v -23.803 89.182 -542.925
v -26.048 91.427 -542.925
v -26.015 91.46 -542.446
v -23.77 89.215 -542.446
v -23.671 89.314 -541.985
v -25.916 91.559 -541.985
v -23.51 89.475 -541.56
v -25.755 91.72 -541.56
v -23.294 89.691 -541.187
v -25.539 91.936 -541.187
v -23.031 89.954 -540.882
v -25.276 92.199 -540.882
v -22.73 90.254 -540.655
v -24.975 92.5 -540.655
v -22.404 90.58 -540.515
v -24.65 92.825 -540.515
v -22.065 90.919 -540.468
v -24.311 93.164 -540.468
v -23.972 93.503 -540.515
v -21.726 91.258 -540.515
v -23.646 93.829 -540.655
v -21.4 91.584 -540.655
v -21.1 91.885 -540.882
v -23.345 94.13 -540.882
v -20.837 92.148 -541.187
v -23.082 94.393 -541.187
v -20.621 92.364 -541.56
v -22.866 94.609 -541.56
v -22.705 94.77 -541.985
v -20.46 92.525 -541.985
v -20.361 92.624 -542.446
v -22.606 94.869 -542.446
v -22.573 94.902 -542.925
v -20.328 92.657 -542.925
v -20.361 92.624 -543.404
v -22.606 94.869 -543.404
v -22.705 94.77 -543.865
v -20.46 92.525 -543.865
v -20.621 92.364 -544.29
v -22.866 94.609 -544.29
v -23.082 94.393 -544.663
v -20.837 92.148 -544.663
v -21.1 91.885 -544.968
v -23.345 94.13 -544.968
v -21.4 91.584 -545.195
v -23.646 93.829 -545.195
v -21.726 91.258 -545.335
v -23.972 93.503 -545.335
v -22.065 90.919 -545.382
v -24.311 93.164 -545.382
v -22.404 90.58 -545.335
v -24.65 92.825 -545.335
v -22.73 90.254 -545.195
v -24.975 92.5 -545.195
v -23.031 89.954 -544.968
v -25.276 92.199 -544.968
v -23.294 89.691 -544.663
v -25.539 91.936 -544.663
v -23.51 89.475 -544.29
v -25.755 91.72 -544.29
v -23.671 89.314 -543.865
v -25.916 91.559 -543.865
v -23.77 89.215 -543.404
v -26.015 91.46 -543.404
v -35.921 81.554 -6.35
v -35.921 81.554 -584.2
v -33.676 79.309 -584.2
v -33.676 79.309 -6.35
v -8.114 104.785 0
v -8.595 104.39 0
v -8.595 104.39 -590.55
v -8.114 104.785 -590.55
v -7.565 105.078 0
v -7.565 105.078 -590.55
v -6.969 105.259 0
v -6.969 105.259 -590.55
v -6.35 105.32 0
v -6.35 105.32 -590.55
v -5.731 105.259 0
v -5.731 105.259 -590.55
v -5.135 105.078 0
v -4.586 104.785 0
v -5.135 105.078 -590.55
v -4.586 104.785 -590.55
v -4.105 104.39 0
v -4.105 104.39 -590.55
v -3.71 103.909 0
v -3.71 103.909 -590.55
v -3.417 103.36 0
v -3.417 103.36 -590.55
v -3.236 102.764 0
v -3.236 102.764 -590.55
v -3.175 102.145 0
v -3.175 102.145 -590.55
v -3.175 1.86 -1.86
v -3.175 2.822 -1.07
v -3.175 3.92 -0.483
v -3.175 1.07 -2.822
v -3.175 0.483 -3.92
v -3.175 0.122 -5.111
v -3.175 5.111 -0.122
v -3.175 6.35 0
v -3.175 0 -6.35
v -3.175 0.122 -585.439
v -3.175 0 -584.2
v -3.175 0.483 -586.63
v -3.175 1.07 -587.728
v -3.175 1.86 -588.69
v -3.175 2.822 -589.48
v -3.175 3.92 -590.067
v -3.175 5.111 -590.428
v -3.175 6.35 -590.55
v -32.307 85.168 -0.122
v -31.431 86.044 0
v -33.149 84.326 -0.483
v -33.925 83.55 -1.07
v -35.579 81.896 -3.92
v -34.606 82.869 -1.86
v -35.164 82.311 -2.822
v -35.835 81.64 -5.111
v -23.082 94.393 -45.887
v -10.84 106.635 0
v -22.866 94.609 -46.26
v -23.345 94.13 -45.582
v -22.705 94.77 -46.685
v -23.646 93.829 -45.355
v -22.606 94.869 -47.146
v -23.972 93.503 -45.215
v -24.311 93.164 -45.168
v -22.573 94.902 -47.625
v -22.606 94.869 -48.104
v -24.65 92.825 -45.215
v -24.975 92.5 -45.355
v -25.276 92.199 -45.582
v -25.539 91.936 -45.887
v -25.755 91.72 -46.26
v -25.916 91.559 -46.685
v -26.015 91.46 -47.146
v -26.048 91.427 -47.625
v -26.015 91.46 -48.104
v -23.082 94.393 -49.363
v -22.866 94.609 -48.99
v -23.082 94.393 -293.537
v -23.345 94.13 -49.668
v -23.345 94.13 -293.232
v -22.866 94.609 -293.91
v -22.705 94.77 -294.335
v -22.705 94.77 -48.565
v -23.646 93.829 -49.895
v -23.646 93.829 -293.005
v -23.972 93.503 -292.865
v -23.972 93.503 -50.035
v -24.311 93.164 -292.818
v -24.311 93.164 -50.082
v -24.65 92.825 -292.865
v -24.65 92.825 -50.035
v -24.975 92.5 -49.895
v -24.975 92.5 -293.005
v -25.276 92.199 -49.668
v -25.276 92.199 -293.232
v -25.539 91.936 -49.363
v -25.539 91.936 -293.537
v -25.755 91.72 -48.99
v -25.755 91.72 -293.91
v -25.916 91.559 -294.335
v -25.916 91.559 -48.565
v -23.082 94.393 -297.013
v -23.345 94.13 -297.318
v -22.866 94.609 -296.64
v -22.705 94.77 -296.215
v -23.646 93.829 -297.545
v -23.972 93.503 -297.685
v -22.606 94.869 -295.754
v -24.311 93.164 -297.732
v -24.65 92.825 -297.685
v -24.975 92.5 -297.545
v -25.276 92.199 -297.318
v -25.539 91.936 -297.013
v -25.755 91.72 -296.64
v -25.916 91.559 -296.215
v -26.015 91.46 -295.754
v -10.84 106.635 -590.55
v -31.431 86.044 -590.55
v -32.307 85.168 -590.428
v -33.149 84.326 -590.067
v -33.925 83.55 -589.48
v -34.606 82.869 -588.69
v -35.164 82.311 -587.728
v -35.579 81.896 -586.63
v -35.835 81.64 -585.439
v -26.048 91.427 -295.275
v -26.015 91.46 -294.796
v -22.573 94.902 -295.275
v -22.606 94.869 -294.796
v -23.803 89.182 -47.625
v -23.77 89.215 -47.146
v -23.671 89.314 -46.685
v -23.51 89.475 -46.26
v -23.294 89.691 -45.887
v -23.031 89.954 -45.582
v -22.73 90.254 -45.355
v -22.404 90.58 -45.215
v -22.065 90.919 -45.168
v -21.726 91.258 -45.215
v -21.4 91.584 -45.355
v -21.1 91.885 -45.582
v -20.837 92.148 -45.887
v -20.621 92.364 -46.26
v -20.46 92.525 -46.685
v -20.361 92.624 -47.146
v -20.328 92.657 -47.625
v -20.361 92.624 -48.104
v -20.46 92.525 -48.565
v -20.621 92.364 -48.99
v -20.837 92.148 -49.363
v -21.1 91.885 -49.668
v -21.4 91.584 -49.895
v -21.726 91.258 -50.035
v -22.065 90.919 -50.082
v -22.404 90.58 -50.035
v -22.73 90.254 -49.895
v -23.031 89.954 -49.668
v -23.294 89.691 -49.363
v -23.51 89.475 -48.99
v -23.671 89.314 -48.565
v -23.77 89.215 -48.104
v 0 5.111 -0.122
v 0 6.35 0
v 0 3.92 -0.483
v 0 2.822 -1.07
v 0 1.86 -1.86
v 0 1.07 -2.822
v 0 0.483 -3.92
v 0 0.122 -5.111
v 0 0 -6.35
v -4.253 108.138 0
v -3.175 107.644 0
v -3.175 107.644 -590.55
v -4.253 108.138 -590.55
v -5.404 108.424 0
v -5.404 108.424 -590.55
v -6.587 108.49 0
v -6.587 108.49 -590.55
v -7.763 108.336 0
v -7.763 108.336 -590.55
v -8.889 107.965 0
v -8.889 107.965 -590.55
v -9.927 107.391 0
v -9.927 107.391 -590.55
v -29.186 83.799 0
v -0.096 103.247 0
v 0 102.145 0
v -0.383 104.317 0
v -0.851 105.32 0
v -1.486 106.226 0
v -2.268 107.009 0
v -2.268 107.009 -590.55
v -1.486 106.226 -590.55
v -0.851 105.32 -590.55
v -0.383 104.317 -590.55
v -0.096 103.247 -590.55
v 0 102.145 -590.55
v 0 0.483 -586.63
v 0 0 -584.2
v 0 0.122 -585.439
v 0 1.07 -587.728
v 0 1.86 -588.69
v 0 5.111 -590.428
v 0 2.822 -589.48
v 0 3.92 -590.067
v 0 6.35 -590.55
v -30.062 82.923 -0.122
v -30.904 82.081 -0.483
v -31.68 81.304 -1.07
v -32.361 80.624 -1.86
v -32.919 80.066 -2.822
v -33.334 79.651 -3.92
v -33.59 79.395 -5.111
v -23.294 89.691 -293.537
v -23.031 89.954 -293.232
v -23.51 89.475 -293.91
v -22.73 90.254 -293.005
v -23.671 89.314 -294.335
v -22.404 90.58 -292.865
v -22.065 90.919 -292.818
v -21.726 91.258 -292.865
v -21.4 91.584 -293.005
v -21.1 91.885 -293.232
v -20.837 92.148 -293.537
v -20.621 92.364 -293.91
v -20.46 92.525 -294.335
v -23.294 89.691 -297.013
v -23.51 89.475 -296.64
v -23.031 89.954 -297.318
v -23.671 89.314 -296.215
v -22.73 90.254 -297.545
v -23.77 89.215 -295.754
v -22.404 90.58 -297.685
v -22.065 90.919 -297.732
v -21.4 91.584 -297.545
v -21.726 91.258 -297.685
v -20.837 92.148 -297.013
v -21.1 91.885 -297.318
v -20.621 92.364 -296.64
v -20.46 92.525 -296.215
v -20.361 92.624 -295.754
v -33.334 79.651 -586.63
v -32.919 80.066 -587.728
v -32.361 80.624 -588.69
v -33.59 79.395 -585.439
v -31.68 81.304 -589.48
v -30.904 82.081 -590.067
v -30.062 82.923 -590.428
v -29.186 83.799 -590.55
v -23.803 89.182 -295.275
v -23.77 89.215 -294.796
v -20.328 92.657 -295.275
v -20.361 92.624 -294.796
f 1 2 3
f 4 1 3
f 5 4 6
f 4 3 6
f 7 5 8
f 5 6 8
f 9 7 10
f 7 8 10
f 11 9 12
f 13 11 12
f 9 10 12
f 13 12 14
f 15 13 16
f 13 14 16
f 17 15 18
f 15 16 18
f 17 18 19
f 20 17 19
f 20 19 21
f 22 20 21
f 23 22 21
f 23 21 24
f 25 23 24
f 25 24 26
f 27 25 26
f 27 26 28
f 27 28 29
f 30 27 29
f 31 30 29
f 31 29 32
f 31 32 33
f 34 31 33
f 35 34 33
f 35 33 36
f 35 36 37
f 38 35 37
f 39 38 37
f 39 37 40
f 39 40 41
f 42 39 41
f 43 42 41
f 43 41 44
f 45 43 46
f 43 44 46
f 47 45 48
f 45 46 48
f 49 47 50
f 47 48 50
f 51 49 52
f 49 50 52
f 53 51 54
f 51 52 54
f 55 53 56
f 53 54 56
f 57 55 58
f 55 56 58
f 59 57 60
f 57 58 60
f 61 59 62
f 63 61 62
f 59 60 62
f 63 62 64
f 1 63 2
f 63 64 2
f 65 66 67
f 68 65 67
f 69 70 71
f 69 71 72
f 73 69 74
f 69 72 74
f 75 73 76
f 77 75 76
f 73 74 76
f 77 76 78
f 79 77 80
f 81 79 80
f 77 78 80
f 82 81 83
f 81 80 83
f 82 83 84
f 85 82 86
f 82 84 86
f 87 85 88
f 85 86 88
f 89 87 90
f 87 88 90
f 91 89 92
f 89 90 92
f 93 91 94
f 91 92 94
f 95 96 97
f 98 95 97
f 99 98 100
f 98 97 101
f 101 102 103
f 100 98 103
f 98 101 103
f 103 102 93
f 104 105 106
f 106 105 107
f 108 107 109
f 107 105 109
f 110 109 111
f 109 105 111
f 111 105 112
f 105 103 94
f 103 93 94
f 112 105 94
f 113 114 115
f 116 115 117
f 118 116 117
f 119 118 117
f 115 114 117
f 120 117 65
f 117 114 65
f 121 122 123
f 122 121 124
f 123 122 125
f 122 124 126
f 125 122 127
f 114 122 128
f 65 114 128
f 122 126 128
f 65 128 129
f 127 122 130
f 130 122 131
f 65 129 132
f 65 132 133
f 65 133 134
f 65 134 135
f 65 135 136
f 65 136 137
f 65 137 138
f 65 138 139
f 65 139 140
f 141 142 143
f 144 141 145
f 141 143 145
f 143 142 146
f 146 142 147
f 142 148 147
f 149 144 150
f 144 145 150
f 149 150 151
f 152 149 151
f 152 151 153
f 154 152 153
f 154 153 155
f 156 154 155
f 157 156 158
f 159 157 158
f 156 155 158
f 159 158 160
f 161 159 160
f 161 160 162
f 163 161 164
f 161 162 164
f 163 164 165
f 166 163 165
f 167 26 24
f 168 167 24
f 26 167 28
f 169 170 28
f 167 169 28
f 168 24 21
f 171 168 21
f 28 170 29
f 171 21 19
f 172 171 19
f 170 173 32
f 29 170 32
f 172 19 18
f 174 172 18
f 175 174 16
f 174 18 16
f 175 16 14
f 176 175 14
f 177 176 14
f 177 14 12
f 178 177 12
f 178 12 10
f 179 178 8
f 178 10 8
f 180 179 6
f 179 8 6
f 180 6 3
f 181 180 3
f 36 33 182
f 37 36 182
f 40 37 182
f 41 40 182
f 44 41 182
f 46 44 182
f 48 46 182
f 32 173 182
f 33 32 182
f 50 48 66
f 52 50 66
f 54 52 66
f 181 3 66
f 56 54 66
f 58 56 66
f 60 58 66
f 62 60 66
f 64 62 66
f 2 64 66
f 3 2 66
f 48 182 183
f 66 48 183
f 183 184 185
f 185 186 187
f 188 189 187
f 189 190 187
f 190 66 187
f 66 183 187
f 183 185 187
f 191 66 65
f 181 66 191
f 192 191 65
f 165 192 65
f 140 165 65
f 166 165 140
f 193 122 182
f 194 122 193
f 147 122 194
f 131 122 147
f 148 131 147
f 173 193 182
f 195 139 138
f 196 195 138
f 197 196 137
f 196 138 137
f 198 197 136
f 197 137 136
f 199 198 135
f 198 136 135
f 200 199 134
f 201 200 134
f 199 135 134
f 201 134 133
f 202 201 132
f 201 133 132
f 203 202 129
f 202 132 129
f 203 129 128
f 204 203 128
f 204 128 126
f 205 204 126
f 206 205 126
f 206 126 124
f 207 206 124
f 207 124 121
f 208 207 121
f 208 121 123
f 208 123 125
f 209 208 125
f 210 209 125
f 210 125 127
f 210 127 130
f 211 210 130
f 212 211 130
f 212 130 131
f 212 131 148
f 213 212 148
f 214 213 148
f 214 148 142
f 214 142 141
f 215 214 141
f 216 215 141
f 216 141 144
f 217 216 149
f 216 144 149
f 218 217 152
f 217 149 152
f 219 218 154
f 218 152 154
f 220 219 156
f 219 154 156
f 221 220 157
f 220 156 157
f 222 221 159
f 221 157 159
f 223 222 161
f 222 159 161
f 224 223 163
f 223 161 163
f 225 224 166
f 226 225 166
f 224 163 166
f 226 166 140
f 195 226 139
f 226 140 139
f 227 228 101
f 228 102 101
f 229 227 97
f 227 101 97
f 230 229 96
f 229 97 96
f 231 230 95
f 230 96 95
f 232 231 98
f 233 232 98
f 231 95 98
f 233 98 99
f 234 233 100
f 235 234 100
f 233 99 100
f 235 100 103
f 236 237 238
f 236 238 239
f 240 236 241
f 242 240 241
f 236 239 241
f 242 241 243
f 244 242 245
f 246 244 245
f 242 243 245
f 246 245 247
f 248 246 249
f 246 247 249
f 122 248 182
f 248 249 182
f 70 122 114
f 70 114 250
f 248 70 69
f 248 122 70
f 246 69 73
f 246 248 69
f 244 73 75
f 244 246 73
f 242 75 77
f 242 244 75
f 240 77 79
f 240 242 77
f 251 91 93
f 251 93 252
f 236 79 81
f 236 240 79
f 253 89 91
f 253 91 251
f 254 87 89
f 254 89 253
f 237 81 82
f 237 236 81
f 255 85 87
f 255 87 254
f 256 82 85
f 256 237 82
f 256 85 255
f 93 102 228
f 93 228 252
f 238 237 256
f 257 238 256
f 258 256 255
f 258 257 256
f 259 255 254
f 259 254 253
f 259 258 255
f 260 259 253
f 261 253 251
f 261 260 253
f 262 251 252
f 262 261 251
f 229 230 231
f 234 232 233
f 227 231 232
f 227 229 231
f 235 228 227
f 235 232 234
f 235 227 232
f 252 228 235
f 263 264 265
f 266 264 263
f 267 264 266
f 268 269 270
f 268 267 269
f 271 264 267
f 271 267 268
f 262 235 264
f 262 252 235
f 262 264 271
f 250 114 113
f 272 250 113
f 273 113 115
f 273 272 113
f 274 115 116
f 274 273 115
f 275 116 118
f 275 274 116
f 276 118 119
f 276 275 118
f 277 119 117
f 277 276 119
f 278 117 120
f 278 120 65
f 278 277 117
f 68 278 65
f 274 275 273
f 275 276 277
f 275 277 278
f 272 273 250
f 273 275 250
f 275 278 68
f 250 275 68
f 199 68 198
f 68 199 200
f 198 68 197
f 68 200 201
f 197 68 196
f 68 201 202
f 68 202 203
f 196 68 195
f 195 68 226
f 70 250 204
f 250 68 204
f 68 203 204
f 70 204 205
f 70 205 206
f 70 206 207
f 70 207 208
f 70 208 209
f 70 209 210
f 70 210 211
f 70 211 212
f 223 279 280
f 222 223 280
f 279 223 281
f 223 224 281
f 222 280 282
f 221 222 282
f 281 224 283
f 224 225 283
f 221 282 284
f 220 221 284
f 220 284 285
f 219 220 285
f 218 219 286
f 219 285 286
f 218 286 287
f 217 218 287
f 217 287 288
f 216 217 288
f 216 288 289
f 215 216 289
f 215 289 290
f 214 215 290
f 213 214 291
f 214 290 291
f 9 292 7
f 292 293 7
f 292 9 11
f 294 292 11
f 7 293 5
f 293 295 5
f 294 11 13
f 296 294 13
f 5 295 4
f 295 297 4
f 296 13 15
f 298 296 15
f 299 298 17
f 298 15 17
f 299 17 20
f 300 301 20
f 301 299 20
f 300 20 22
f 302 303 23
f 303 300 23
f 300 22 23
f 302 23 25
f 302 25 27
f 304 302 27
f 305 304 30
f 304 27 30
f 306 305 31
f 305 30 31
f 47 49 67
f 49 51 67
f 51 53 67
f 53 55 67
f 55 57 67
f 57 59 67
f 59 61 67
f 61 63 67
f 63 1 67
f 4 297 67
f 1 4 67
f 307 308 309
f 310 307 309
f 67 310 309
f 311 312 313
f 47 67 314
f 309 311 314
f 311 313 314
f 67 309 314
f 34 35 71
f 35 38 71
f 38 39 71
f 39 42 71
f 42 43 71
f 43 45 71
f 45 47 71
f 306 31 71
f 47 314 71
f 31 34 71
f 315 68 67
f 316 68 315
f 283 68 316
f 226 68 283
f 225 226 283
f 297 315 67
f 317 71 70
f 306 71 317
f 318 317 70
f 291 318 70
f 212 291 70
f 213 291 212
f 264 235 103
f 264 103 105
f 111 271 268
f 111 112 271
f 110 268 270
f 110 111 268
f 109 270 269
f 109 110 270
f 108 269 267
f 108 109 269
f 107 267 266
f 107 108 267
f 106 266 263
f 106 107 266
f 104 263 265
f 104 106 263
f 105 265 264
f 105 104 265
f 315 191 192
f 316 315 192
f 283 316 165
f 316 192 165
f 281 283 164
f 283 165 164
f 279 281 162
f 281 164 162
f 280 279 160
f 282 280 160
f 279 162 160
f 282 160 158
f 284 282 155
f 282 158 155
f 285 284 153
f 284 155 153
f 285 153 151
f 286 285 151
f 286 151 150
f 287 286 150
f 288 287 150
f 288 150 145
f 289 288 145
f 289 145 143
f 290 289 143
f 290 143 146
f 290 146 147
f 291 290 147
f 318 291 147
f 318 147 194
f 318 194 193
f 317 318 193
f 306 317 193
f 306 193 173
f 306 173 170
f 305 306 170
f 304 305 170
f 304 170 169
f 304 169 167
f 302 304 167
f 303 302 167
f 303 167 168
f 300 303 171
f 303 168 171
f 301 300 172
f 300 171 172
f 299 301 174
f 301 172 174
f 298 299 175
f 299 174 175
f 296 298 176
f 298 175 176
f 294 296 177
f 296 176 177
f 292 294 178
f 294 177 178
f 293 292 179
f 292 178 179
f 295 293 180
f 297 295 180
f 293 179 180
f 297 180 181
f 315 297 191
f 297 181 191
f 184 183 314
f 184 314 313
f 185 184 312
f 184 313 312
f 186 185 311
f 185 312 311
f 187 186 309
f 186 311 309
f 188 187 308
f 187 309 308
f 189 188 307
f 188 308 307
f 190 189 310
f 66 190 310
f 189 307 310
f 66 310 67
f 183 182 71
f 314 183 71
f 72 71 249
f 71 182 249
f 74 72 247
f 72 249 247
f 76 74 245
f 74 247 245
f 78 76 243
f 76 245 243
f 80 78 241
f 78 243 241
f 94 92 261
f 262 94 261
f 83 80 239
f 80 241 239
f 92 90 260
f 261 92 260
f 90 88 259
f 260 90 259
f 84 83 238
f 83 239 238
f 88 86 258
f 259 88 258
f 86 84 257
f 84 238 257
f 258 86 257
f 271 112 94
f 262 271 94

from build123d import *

# Parameters (mm, degrees)
SKETCH1_W            = 590.55
SKETCH1_H            = 114.3
BASE_FLANGE1_DEPTH   = 3.175
EDGE_FLANGE1_START   = -590.55
EDGE_FLANGE1_DEPTH   = 590.55
EDGE_FLANGE1_2_DEPTH = 590.55
FILLET1_R            = 6.35
SKETCH9_R            = 2.45745
CUT_EXTRUDE1_DEPTH   = 3.18516


# Read off the part's stored shape, not the designer's step: Edge-Flange1
# Sheet-metal steps are written as plain solids
with BuildPart() as part:
    # Sketch1 → Base-Flange1 (new body)
    with BuildSketch(Plane(origin=(0, 0, 0), x_dir=(0, 0, -1), z_dir=(1, 0, 0))):
        with Locations((295.275, 57.15)):
            Rectangle(SKETCH1_W, SKETCH1_H)
    extrude(amount=-BASE_FLANGE1_DEPTH)

    # Edge-Flange1 outline → Edge-Flange1 (cut)
    with BuildSketch(Plane.XY.offset(EDGE_FLANGE1_START)):
        with BuildLine():
            Line((-3.175, 114.3), (-3.175, 107.644005193))
            ThreePointArc((-3.175, 107.644005193), (-0.850738686, 105.319743879), (0, 102.144743879))
            Line((0, 102.144743879), (0, 114.3))
            Line((0, 114.3), (-3.175, 114.3))
        make_face()
    extrude(amount=EDGE_FLANGE1_DEPTH, mode=Mode.SUBTRACT)

    # Edge-Flange1 2 outline → Edge-Flange1 2 (add)
    with BuildSketch(Plane.XY.offset(EDGE_FLANGE1_START)):
        with BuildLine():
            ThreePointArc((-3.175, 107.644005193), (-7.178841321, 108.440418748), (-10.840128061, 106.634871939))
            Line((-10.840128061, 106.634871939), (-35.921024484, 81.553975516))
            Line((-35.921024484, 81.553975516), (-33.675960454, 79.308911485))
            Line((-33.675960454, 79.308911485), (-8.59506403, 104.389807909))
            ThreePointArc((-8.59506403, 104.389807909), (-5.134980102, 105.078061395), (-3.175, 102.144743879))
            Line((-3.175, 102.144743879), (-3.175, 107.644005193))
        make_face()
    extrude(amount=EDGE_FLANGE1_2_DEPTH)

    # Fillet1
    fillet1_edges = [part.edges().sort_by_distance(p)[0] for p in [
        (-34.798492469, 80.4314435, 0),
        (-34.798492469, 80.4314435, -590.55),
        (-1.5875, 0, -590.55),
        (-1.5875, 0, 0),
    ]]
    fillet(fillet1_edges, radius=FILLET1_R)

    # Sketch9 → Cut-Extrude1 (cut)
    with BuildSketch(Plane(origin=(-58.7375, 58.7375, 0), x_dir=(0, 0, 1), z_dir=(-0.7071067811865465, 0.7071067811865487, 0))):
        with Locations(Location((-542.925, 48.687112999, 0), (0, 0, 270))):
            Circle(SKETCH9_R)
        with Locations(Location((-295.275, 48.687112999, 0), (0, 0, 270))):
            Circle(SKETCH9_R)
        with Locations(Location((-47.625, 48.687112999, 0), (0, 0, 270))):
            Circle(SKETCH9_R)
    extrude(amount=-CUT_EXTRUDE1_DEPTH, mode=Mode.SUBTRACT)


solid = part.part
